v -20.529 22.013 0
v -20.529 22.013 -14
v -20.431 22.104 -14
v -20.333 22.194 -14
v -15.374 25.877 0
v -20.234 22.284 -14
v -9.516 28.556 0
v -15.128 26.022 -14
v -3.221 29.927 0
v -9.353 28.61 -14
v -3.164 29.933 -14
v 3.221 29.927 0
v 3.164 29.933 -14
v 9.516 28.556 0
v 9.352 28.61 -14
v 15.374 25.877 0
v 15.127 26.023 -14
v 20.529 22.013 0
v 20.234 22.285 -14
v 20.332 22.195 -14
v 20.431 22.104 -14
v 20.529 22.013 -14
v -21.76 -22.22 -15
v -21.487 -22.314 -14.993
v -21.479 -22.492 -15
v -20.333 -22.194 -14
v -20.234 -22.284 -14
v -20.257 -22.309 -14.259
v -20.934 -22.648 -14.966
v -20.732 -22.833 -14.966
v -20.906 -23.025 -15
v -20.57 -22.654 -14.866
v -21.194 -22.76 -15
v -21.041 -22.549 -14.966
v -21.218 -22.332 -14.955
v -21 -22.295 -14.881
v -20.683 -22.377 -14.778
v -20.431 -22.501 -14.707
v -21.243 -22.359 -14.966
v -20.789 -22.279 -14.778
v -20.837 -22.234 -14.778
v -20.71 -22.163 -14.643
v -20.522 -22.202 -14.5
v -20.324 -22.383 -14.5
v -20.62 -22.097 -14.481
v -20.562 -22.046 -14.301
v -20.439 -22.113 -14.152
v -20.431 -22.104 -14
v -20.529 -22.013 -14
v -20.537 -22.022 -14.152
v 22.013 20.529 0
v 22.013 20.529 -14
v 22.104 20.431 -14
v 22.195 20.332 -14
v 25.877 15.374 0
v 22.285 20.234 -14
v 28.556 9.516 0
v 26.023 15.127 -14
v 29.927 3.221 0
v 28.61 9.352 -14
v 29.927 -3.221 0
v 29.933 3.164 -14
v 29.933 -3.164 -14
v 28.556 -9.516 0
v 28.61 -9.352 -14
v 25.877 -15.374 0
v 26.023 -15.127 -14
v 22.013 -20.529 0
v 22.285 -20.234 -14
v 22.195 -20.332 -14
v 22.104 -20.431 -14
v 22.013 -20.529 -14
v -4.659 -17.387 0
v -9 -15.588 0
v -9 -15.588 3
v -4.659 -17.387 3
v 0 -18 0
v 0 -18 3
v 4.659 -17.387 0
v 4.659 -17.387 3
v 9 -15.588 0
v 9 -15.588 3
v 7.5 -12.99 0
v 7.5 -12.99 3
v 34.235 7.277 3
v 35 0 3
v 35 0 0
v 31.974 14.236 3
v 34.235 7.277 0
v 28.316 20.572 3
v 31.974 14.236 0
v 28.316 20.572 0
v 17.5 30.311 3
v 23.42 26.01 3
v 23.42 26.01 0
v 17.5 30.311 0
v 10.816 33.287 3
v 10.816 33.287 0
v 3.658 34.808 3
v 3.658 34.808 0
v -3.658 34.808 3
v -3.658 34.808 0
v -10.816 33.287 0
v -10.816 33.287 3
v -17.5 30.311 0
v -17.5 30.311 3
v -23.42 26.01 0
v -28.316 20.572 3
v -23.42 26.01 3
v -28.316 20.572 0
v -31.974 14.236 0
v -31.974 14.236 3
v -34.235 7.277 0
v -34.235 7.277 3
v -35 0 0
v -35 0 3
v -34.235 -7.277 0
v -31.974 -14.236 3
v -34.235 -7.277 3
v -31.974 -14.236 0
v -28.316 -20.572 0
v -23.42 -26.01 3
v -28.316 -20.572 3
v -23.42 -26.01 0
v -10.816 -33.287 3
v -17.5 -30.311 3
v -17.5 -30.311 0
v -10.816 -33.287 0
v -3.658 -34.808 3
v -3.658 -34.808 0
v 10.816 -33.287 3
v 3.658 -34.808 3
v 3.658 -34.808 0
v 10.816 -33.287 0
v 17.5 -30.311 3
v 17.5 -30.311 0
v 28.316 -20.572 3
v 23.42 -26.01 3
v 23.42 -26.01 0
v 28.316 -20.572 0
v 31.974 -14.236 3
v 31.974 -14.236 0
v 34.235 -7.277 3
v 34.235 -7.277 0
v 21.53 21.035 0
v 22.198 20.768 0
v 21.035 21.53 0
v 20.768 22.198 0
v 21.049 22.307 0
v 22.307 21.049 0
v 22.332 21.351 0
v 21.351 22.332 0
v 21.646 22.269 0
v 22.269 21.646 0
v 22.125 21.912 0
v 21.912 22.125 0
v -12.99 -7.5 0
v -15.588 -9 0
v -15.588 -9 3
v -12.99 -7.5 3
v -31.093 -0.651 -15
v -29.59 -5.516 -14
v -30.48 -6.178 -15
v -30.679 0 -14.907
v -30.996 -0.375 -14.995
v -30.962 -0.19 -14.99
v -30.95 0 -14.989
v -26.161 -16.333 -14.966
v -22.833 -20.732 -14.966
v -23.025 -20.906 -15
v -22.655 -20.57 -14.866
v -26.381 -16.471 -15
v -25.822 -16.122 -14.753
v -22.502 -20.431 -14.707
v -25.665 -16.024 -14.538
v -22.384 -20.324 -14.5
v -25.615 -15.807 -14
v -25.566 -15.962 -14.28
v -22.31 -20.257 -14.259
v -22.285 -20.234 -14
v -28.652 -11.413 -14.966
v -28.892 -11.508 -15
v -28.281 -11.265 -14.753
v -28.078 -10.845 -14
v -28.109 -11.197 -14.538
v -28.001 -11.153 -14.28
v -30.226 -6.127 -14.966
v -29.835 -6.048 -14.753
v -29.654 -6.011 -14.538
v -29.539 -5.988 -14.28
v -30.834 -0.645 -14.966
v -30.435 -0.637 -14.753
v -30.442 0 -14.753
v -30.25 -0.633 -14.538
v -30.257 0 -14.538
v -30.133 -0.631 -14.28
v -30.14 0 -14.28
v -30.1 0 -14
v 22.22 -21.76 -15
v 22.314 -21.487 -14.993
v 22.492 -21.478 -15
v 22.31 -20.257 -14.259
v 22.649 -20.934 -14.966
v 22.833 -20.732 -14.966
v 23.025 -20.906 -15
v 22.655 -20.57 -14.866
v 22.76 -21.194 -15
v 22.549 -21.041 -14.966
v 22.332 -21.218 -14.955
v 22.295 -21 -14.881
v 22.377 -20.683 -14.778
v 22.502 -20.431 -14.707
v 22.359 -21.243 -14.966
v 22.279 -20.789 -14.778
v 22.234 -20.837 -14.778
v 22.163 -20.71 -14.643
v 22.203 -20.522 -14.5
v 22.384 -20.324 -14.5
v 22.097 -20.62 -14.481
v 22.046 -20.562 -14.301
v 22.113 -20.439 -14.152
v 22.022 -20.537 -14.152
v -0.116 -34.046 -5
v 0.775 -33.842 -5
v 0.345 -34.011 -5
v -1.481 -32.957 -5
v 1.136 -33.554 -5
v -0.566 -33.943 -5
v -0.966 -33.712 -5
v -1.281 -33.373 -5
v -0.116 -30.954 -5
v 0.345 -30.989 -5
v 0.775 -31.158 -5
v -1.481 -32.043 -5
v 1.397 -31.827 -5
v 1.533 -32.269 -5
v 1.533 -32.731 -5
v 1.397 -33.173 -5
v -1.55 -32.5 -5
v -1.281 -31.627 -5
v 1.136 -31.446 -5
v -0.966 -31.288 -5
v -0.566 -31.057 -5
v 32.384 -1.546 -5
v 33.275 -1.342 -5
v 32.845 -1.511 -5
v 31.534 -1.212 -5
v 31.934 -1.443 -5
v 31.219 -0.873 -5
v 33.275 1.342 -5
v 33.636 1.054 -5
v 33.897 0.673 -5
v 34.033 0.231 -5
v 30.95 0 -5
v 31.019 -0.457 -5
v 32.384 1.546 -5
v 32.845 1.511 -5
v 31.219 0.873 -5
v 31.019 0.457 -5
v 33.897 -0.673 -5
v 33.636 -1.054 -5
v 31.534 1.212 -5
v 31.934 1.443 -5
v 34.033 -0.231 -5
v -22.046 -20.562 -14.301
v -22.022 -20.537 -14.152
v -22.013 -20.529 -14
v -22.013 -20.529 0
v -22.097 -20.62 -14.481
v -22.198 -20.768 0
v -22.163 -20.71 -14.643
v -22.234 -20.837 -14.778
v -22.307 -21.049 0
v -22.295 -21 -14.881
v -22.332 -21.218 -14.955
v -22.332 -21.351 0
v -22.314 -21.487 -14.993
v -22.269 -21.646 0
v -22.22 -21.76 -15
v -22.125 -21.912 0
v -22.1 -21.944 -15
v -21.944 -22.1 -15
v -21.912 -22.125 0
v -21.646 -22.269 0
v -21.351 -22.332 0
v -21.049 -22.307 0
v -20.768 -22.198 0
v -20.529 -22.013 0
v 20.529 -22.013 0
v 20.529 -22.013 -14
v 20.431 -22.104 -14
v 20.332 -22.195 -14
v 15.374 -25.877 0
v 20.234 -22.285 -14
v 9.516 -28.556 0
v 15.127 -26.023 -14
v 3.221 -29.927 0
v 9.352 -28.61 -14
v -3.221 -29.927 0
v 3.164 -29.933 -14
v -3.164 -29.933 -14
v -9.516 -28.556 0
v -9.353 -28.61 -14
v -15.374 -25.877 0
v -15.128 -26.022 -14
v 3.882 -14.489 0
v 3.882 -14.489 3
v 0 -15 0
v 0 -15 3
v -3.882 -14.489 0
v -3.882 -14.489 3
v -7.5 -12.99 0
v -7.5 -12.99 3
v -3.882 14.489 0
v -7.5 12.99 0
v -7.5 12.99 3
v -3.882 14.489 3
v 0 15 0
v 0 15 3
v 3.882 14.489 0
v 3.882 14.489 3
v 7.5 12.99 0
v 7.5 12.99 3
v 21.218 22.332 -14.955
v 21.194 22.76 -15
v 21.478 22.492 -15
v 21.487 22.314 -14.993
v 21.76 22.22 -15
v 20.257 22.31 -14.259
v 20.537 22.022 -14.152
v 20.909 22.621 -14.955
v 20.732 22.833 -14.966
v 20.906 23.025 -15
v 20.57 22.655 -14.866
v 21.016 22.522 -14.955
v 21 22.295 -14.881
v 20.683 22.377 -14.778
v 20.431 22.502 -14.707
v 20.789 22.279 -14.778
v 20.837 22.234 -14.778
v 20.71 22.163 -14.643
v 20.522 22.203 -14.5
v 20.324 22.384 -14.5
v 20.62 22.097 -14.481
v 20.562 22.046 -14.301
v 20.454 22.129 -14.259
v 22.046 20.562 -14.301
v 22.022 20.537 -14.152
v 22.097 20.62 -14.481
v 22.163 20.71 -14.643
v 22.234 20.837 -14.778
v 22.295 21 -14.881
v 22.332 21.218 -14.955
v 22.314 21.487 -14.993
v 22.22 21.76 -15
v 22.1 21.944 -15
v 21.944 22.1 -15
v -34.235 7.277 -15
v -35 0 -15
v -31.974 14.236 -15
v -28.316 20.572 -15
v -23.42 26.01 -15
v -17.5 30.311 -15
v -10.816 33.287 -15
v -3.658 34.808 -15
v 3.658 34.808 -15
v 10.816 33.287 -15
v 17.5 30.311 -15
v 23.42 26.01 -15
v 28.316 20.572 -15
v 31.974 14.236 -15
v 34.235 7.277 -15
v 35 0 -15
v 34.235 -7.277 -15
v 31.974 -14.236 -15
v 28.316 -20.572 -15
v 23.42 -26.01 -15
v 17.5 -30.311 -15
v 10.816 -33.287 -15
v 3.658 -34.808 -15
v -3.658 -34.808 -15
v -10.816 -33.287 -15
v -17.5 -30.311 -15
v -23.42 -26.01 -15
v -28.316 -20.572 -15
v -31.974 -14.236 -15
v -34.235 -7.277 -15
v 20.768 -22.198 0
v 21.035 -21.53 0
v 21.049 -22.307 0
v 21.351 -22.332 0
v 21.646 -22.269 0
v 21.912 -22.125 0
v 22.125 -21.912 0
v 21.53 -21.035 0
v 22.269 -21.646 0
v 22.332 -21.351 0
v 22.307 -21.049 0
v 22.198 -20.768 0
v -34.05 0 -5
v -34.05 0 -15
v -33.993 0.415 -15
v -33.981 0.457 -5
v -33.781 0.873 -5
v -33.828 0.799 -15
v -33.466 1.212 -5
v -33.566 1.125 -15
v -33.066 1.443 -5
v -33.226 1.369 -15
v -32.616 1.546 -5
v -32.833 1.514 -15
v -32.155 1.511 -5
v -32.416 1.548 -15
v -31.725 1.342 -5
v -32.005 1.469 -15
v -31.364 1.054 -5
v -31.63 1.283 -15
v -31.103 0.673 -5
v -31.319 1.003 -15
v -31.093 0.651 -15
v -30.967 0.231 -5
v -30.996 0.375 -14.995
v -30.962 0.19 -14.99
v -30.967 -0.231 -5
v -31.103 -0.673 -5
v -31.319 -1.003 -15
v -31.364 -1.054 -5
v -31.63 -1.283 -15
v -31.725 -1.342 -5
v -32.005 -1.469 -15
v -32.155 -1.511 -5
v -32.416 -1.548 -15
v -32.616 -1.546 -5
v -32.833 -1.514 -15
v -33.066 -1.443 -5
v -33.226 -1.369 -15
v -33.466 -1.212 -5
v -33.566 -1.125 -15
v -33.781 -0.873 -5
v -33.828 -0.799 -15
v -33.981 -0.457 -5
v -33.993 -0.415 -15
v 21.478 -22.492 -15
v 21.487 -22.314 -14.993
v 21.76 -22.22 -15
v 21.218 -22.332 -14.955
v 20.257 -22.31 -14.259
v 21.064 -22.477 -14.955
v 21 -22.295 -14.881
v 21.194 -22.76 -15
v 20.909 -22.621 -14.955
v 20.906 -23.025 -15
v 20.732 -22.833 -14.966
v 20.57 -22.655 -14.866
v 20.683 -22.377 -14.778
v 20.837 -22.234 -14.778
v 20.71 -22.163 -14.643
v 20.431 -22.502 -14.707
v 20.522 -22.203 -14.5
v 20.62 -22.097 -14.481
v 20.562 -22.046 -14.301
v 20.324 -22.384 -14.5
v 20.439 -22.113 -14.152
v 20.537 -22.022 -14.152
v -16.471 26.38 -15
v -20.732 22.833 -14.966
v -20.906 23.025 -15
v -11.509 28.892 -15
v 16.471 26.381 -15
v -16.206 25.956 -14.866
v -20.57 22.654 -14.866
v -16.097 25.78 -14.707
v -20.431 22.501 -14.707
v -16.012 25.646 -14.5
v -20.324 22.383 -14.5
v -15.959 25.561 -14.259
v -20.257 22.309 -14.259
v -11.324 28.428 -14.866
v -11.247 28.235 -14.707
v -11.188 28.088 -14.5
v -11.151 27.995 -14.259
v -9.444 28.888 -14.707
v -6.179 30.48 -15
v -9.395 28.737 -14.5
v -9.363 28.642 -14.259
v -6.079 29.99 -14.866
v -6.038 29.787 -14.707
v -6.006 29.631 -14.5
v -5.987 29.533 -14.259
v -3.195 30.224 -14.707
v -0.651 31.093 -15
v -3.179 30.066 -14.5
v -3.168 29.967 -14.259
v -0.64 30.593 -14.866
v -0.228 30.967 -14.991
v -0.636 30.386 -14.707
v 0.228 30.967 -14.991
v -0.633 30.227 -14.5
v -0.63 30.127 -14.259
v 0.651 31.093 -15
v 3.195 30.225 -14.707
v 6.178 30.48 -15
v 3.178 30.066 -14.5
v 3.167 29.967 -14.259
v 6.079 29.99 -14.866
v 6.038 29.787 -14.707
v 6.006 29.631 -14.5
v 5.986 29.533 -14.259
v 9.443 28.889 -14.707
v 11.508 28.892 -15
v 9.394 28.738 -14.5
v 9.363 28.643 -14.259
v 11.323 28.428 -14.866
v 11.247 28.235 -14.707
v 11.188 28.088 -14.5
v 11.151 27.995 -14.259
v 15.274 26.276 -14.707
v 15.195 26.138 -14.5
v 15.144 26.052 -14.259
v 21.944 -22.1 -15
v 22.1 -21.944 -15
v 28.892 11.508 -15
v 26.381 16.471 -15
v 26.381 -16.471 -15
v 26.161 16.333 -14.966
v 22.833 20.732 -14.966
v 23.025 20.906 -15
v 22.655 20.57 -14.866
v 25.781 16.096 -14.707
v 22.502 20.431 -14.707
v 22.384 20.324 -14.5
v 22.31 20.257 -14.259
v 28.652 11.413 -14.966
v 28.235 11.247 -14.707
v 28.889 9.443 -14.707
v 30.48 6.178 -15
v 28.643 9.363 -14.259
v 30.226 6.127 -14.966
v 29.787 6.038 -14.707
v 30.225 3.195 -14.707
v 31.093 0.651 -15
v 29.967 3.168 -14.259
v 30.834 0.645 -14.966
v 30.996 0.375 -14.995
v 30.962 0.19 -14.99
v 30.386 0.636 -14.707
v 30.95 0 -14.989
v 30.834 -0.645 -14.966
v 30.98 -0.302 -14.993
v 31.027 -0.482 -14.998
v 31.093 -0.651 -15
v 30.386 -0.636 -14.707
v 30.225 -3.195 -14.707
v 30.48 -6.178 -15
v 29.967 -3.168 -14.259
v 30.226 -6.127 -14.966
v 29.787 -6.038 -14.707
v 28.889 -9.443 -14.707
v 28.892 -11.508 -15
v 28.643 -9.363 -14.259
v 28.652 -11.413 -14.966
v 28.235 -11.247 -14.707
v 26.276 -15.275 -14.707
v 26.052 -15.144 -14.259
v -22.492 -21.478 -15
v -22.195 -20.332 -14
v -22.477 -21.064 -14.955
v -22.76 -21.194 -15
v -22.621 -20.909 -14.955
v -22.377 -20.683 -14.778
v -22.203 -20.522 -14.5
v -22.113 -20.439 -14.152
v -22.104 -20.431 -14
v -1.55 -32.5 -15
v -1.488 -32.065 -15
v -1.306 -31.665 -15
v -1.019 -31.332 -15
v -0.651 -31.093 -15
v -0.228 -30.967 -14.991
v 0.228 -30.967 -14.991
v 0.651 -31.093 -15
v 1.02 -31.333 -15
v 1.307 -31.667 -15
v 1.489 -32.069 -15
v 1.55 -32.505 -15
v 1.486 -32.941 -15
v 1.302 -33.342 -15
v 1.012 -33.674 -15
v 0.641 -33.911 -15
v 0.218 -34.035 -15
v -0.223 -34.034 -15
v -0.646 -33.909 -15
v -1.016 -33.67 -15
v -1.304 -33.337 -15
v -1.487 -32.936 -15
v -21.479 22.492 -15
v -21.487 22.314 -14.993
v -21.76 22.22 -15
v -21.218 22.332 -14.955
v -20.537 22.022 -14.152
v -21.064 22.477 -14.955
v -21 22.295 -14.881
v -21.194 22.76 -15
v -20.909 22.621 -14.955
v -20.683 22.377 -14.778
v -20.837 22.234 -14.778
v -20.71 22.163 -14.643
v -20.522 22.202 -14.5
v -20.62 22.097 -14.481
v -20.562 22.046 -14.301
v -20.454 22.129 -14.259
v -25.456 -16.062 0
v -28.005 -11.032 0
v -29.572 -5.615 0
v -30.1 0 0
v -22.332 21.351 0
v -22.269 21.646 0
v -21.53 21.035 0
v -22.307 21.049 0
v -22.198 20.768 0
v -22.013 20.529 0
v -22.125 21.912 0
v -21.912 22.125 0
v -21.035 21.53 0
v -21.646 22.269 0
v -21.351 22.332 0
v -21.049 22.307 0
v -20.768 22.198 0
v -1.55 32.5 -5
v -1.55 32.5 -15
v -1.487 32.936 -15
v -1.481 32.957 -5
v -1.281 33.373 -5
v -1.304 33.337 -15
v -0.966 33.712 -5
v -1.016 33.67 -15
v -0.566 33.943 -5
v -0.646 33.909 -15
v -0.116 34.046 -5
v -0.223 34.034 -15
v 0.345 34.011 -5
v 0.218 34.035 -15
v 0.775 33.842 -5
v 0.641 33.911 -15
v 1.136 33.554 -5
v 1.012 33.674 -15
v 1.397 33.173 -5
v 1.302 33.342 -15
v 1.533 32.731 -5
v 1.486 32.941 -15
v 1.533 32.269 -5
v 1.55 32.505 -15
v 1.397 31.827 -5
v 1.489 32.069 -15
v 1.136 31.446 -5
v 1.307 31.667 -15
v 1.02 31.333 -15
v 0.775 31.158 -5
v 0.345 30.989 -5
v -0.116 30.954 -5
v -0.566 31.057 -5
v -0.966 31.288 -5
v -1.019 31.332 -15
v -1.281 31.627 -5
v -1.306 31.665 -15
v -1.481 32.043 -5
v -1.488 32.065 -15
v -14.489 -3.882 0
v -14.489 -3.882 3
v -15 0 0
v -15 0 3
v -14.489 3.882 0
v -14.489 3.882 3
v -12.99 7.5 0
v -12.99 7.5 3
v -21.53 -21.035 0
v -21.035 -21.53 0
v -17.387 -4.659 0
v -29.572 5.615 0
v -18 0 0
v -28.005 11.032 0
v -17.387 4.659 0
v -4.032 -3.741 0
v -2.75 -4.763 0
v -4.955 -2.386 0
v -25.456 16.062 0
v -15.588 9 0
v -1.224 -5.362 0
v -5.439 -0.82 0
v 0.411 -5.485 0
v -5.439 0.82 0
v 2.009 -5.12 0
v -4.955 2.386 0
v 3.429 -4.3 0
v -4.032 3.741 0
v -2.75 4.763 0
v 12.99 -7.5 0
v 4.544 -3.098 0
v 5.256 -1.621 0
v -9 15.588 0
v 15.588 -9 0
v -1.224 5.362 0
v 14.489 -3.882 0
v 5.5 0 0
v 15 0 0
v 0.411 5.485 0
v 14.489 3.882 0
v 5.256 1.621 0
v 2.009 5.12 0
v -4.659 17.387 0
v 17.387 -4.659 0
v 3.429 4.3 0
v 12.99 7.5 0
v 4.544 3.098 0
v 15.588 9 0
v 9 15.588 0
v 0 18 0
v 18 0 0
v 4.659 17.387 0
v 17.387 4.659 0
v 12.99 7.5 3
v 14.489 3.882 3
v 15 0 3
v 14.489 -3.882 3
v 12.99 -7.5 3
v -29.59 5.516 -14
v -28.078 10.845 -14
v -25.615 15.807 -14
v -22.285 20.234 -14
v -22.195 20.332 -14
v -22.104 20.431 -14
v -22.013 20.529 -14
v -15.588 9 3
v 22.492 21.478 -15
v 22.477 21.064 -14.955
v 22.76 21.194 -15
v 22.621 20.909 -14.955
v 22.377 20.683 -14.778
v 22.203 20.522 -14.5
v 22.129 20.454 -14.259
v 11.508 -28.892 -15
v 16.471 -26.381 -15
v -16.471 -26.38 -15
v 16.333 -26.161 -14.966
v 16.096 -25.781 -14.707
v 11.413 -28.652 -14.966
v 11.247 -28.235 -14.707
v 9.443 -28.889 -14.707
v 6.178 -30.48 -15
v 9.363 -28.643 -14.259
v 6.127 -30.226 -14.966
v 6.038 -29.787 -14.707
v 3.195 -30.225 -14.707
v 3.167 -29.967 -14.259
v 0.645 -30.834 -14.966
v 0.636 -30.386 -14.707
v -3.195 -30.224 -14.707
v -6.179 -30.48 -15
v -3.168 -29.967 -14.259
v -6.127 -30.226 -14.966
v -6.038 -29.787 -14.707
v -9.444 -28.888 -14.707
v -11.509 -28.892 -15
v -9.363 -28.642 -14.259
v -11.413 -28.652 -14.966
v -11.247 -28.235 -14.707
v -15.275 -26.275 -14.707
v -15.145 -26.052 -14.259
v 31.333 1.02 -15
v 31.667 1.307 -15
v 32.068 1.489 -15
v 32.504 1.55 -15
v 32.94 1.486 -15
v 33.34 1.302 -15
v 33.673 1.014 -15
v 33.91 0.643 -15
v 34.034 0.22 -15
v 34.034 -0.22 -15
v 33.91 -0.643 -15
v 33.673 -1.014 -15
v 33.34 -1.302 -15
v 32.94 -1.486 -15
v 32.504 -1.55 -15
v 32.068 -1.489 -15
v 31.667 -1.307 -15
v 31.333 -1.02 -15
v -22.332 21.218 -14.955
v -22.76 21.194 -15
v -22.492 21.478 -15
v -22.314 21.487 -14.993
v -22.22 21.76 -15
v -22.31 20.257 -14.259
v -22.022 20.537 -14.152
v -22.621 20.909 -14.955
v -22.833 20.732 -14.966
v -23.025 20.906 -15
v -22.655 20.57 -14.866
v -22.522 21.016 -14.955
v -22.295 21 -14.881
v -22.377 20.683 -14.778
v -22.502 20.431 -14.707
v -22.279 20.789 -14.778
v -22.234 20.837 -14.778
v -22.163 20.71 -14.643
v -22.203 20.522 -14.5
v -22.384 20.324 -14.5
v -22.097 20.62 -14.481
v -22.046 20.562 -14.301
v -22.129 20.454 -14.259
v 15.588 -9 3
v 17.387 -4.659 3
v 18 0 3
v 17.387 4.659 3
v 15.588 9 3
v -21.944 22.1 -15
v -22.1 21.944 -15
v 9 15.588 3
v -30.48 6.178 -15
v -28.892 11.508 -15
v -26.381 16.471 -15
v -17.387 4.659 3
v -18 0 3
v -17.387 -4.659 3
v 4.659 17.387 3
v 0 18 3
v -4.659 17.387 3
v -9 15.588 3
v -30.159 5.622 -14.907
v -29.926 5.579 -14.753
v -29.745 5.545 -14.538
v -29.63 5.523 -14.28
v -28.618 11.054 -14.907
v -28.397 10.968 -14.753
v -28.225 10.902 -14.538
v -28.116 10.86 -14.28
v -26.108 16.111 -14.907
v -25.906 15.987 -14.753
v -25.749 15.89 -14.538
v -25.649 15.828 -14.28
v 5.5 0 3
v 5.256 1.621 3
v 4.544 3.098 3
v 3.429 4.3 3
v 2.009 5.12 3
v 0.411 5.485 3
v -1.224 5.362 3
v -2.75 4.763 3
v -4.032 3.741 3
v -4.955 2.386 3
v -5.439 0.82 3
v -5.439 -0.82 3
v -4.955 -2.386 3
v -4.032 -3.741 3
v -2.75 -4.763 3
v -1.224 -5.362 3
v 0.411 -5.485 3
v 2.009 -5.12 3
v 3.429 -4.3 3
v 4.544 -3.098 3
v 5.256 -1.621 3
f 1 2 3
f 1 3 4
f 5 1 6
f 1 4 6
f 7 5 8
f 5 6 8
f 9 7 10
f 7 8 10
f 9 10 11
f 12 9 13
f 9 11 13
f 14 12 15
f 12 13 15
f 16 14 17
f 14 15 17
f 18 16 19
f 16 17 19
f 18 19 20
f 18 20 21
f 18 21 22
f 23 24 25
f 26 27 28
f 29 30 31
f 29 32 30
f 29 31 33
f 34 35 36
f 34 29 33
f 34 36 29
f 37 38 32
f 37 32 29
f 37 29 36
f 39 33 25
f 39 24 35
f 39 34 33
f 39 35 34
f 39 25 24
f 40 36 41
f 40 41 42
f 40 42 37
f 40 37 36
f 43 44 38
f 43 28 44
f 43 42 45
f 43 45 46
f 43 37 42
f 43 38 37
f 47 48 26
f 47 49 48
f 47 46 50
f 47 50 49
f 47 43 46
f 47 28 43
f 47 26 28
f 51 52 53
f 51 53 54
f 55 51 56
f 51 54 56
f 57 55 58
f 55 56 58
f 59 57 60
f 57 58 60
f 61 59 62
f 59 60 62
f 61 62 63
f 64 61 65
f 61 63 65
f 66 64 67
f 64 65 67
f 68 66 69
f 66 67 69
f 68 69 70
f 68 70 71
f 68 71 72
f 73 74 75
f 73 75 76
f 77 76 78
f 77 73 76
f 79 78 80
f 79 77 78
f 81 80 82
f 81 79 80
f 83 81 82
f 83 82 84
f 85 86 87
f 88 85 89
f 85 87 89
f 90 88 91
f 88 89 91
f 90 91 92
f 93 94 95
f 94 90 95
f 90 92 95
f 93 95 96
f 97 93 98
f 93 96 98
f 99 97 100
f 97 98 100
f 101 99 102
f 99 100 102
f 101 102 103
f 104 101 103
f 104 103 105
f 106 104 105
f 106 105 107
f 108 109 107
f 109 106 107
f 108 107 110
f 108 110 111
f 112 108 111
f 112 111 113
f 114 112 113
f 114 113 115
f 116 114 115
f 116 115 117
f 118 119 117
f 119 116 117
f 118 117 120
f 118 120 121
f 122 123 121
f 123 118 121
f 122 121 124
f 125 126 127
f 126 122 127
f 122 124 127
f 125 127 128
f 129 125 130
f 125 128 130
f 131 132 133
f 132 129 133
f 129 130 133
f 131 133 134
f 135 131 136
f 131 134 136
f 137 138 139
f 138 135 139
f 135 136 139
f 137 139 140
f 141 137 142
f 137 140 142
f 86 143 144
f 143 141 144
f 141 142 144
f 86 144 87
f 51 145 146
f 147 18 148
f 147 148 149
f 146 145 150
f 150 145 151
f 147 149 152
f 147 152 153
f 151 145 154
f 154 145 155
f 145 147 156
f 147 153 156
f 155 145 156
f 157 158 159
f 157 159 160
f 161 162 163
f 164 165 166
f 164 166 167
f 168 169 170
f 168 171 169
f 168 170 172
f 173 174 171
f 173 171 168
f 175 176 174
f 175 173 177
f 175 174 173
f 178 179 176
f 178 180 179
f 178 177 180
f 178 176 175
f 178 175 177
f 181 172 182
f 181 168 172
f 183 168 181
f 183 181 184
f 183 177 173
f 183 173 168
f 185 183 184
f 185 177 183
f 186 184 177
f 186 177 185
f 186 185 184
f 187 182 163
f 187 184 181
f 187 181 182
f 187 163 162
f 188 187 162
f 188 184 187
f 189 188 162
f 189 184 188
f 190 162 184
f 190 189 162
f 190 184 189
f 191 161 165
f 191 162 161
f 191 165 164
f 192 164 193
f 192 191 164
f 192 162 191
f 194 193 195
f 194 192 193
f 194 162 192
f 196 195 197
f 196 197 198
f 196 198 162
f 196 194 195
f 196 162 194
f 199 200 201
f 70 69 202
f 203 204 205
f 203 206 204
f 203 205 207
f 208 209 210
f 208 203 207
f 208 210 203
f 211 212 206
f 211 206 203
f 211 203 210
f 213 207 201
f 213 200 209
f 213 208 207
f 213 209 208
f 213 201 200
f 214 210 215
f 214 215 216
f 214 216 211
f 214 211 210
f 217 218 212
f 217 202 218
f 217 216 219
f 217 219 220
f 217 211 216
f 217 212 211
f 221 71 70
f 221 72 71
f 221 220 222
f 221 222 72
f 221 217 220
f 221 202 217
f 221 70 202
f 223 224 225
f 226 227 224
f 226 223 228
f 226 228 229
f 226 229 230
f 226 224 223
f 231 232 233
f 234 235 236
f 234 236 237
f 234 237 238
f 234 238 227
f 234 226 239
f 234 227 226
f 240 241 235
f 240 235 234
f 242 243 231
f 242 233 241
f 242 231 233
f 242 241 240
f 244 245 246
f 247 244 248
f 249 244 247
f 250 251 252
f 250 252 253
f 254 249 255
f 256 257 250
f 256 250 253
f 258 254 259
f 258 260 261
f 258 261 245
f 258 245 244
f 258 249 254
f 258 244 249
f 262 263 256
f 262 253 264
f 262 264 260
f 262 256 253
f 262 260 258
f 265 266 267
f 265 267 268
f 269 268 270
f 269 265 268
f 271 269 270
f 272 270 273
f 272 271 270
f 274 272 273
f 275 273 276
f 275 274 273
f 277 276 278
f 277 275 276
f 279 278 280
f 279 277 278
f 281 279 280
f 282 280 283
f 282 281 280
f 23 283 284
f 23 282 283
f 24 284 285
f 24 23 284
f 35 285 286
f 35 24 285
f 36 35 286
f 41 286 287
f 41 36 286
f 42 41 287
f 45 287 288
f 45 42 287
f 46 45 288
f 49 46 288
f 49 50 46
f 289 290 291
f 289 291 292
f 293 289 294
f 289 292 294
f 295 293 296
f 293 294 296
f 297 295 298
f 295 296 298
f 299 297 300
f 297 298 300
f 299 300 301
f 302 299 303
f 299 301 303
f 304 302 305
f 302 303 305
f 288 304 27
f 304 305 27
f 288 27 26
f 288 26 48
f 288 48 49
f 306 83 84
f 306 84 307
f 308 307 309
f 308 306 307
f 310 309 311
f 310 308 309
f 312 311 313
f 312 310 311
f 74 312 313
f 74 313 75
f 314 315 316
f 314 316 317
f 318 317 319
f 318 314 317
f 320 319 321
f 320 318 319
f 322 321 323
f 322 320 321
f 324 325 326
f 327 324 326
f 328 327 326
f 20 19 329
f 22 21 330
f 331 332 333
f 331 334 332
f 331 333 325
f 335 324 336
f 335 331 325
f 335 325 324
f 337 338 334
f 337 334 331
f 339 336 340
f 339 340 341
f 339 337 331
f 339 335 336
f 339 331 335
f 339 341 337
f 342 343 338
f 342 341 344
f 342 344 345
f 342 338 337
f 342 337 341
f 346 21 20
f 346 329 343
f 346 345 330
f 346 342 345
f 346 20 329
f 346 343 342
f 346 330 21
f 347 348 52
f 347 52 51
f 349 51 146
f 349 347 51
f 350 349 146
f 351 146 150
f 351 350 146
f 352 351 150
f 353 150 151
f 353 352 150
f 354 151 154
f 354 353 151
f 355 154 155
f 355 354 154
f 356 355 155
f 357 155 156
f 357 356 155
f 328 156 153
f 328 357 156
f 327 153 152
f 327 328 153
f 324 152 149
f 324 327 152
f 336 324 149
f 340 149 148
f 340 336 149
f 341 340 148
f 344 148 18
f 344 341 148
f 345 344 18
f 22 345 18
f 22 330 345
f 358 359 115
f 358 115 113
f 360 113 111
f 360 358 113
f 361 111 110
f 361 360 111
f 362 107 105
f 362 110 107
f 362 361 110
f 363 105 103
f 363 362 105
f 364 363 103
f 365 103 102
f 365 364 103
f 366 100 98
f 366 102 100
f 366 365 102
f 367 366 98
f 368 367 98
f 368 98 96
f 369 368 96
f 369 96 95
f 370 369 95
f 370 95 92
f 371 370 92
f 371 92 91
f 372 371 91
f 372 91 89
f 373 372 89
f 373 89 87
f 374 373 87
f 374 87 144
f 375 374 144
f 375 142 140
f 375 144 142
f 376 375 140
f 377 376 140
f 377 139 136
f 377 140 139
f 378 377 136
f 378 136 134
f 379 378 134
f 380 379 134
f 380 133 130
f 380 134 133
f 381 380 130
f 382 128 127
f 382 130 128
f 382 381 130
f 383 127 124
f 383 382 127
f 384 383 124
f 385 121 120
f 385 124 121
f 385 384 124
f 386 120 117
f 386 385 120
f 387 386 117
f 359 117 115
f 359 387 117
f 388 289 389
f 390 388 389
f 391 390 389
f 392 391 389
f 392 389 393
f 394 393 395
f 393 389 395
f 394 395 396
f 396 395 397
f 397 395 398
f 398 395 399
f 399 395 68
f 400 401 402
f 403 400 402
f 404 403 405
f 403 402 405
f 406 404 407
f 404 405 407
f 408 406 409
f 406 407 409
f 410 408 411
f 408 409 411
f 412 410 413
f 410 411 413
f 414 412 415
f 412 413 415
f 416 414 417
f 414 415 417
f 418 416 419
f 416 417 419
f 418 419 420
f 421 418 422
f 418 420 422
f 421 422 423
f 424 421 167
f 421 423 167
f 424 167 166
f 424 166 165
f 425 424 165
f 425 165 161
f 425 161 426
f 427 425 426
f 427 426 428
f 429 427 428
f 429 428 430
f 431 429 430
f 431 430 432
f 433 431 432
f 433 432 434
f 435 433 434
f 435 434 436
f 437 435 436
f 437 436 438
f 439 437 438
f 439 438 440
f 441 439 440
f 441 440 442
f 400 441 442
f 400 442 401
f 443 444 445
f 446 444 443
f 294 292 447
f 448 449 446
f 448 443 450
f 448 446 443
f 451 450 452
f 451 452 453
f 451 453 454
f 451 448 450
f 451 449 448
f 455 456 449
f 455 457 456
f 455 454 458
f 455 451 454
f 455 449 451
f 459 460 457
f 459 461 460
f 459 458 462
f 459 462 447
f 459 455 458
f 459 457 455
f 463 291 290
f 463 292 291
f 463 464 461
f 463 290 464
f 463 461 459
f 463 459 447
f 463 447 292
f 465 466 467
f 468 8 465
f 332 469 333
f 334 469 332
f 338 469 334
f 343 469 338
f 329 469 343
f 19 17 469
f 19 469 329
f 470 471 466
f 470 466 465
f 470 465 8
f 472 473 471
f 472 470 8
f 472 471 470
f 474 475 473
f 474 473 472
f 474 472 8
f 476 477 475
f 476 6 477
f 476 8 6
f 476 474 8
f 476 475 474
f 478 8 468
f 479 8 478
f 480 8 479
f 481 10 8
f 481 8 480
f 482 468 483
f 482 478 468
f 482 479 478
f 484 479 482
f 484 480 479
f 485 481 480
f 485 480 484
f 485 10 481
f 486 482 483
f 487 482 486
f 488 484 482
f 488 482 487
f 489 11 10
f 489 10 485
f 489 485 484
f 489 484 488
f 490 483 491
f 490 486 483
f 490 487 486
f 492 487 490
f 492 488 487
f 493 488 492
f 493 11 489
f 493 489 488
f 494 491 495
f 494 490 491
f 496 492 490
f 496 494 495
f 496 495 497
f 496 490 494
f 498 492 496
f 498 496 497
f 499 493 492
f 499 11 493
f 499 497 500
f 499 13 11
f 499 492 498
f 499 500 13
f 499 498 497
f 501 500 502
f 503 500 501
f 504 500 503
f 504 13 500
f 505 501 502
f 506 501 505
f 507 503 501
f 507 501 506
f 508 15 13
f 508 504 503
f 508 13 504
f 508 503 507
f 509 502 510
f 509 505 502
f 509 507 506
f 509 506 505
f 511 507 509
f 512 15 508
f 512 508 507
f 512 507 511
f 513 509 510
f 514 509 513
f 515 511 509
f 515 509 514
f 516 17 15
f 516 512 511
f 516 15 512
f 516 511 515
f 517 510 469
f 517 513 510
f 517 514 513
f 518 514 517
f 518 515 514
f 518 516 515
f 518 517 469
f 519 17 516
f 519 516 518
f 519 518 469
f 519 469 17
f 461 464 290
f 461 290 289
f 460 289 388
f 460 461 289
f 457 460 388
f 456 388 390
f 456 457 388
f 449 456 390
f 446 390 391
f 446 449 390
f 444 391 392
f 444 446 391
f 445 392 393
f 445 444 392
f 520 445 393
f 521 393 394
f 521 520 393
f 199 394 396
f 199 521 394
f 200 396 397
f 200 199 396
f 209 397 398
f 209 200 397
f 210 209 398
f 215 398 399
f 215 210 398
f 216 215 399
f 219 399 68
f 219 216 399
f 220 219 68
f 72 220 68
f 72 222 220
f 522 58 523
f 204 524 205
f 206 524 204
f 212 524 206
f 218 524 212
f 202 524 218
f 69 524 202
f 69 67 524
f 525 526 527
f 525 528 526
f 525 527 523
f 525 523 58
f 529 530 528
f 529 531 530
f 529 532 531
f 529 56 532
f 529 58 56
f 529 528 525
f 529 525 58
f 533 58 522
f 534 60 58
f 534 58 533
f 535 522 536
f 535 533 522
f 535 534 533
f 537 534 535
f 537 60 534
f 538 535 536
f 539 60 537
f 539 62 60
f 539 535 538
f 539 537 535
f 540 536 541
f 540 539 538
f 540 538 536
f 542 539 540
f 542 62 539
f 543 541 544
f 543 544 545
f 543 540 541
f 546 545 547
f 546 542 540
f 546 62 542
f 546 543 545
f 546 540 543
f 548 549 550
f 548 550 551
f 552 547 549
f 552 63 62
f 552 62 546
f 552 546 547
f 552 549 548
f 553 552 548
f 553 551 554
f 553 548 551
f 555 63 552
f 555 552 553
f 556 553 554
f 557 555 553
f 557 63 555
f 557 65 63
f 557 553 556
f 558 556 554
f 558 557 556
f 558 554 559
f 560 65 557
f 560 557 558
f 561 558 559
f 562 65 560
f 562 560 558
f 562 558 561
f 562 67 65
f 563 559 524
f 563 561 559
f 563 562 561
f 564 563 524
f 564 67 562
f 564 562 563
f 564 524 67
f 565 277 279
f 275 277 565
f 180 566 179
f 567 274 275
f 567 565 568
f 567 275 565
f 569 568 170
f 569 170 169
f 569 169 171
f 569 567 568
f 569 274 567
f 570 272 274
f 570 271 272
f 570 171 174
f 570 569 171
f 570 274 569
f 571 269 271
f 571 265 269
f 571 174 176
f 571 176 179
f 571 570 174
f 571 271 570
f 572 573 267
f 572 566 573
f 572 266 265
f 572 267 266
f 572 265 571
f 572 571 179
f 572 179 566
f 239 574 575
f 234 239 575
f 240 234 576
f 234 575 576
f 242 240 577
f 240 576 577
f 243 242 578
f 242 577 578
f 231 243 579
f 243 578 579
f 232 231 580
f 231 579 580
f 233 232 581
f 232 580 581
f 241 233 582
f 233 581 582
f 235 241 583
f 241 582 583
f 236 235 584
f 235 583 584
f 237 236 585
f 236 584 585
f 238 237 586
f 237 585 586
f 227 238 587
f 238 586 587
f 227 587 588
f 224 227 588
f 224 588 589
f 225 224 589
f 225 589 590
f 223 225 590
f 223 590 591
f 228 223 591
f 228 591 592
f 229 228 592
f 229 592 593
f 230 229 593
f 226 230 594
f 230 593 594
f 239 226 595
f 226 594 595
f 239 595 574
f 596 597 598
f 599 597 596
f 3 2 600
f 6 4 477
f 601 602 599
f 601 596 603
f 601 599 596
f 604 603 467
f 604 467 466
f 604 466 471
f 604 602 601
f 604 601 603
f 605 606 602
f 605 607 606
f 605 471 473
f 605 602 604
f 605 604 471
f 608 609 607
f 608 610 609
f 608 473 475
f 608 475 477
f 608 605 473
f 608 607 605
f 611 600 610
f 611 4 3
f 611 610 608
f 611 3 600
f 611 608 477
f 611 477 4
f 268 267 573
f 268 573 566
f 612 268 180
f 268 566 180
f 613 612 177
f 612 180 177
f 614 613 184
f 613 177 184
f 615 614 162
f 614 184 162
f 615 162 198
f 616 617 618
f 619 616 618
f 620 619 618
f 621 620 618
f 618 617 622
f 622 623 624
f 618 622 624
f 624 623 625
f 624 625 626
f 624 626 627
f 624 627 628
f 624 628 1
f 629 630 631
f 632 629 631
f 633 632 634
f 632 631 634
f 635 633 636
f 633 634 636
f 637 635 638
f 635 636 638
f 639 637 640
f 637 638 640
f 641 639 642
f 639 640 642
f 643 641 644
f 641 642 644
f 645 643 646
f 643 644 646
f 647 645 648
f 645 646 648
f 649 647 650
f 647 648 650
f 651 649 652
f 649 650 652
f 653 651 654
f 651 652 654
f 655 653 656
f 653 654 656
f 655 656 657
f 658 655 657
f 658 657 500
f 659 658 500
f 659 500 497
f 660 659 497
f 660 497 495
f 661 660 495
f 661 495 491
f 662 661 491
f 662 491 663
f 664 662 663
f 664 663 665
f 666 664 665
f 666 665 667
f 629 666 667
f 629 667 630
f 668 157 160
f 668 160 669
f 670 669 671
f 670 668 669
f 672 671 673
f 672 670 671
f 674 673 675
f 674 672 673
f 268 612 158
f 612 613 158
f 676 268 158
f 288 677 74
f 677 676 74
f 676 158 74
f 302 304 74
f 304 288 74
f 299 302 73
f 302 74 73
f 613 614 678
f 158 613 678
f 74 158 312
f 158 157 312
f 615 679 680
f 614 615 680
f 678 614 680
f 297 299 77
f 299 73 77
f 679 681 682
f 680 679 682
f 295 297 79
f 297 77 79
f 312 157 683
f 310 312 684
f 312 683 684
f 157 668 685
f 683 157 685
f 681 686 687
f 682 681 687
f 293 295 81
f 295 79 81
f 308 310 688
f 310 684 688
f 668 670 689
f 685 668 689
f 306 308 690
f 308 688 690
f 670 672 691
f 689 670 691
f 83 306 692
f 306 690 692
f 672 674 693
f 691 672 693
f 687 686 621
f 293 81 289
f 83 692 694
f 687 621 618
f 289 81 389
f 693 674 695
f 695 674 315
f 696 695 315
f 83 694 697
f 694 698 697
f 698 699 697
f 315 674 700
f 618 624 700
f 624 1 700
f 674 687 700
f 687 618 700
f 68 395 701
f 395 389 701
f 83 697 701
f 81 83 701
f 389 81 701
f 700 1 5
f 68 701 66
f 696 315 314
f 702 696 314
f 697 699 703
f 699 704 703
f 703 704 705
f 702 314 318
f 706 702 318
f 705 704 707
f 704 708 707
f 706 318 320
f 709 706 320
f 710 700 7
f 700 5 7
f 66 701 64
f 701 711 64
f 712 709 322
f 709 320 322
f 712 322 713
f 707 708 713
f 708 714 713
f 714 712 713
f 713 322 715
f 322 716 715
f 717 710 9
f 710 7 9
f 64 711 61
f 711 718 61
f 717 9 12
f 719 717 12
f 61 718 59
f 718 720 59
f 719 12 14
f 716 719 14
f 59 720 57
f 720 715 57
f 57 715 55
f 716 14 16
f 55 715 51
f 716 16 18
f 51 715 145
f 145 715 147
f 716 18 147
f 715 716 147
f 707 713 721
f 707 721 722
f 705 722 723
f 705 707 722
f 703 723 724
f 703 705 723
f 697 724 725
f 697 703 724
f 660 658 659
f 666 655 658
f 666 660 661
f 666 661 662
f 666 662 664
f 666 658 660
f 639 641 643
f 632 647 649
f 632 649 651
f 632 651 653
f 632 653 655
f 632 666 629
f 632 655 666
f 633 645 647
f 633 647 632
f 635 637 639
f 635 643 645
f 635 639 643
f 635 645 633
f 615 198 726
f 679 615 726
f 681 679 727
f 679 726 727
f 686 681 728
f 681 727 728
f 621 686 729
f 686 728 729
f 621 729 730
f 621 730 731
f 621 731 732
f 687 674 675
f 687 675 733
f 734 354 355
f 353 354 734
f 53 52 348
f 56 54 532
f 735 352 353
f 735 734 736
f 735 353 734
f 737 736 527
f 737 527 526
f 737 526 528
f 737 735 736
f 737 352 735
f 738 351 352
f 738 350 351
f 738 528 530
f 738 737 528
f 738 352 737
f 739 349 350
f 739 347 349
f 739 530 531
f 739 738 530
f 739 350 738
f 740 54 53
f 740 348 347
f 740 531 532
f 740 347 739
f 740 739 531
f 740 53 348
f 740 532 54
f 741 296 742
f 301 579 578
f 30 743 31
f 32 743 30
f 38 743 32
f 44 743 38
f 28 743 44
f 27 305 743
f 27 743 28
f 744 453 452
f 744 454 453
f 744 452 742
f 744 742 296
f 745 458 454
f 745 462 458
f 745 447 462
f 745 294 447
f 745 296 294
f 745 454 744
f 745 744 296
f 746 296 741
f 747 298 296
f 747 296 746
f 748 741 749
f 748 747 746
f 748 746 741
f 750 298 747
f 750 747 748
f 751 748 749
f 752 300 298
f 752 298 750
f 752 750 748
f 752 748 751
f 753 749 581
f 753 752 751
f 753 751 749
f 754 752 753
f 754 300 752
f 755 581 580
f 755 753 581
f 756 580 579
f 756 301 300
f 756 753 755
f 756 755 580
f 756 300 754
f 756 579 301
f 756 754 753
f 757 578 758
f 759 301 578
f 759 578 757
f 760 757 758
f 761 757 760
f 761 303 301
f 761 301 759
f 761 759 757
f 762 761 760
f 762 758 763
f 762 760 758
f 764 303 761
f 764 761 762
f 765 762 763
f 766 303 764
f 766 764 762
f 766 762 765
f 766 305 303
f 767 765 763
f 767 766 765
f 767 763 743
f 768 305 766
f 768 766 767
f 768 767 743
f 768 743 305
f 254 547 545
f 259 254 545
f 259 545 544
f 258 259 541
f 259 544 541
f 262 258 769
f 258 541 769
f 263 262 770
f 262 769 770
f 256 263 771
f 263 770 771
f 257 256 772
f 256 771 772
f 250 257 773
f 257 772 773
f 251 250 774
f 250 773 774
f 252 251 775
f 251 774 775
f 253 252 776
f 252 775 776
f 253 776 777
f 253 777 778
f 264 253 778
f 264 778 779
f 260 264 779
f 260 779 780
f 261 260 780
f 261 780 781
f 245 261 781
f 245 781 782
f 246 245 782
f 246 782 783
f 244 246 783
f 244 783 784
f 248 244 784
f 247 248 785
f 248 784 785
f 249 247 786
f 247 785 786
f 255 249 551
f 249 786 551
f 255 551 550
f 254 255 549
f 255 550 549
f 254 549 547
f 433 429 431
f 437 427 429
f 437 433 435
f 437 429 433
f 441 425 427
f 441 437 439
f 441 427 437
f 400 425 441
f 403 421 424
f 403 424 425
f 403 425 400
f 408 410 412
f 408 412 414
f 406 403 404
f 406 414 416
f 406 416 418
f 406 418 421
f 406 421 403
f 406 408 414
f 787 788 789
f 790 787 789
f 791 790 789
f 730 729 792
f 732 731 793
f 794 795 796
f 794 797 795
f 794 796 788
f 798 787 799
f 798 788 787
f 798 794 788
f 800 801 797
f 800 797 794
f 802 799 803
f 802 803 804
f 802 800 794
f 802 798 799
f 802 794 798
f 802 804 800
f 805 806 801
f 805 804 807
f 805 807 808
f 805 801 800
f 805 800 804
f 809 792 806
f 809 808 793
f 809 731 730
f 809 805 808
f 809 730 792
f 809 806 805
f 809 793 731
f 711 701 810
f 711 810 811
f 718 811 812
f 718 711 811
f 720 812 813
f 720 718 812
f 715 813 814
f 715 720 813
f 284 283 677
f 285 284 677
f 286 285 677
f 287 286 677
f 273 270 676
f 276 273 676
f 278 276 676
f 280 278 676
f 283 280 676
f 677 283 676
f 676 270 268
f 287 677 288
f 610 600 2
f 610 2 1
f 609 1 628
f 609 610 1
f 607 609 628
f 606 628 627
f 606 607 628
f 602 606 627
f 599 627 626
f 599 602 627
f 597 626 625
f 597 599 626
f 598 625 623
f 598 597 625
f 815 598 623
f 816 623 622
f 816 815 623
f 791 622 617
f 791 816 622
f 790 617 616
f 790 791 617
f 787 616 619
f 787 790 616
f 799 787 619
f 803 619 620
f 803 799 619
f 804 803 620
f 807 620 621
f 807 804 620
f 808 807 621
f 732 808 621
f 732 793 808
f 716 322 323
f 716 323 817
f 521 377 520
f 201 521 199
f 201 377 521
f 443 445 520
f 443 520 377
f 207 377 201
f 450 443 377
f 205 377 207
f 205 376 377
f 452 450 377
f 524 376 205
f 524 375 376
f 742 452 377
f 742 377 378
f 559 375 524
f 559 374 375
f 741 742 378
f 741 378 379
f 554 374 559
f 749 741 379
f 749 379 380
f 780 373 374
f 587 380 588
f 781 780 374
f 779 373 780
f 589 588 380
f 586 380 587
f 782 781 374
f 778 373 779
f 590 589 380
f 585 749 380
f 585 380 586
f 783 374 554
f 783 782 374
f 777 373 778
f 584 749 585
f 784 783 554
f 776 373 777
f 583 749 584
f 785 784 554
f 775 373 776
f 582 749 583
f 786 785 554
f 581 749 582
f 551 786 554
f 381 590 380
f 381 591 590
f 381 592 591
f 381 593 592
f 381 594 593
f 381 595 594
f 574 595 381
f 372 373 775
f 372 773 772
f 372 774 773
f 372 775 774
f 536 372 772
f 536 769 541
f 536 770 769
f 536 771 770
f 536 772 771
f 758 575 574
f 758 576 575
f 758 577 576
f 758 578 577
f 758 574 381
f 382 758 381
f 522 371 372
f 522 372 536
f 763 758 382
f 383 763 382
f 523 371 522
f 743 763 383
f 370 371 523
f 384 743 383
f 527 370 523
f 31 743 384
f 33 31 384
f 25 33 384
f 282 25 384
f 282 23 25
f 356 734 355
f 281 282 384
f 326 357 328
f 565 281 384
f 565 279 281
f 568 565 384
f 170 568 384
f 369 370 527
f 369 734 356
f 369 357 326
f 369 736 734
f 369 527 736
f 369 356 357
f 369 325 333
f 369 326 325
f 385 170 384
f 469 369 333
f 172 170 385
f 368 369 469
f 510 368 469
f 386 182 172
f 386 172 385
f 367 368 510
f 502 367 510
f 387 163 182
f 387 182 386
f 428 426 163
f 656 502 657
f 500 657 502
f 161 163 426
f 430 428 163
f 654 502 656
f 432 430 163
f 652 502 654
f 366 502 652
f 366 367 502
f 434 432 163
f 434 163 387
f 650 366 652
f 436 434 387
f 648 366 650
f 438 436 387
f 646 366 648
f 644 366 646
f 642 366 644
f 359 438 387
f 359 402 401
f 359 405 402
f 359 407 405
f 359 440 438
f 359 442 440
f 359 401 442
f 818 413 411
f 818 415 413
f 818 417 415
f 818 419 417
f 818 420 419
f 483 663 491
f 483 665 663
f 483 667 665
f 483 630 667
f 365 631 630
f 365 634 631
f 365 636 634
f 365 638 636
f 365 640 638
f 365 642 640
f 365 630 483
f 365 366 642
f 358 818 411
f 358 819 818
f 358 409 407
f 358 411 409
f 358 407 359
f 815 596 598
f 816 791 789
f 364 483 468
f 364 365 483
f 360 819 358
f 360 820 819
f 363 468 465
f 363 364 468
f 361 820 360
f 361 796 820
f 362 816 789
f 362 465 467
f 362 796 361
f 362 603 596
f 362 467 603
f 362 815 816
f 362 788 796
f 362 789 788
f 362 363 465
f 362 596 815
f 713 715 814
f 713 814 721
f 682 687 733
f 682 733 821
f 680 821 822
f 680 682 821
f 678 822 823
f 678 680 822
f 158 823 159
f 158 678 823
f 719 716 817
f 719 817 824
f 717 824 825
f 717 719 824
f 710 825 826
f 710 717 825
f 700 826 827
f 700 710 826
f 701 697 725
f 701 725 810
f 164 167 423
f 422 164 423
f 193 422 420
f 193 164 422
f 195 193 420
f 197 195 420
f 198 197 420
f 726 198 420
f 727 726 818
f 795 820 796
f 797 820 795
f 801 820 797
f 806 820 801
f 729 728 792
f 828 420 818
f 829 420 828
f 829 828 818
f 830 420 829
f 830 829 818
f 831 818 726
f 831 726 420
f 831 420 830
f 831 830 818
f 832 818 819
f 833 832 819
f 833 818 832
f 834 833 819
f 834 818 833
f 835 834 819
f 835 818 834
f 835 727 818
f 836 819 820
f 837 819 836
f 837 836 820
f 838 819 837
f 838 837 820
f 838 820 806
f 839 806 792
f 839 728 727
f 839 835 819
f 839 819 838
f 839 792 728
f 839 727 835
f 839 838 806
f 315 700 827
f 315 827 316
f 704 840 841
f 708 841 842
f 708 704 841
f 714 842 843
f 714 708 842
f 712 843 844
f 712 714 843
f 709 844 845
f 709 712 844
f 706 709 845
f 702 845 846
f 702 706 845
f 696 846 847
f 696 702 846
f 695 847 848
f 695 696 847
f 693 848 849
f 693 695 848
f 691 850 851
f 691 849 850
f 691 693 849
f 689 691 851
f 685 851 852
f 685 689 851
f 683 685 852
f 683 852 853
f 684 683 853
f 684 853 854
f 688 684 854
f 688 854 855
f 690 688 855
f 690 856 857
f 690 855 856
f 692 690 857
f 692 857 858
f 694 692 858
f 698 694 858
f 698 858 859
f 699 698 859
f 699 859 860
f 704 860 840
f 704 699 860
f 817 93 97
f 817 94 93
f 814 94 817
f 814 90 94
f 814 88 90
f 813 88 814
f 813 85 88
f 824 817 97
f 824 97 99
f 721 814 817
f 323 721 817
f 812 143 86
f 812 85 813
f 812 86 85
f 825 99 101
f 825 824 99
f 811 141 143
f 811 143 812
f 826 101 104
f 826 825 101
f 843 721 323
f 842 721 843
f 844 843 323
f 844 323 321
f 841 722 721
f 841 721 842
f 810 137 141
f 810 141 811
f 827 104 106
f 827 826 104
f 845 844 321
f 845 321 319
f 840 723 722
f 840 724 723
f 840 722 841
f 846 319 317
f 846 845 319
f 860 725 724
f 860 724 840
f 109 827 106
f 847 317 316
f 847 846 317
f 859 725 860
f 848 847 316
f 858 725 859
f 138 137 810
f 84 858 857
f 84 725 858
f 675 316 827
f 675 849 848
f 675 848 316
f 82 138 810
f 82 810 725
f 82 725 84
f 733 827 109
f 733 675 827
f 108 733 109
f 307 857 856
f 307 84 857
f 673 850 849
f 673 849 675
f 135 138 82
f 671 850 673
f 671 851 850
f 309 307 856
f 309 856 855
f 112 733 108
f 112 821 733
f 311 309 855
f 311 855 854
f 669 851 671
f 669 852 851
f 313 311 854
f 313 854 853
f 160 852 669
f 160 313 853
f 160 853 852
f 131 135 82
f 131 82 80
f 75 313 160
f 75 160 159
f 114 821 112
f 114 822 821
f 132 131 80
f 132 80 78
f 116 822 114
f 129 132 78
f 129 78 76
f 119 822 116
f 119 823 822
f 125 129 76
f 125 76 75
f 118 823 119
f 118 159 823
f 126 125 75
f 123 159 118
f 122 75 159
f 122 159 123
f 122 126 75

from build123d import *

# Parameters (mm, degrees)
SKETCH_2_R          = 35
SKETCH_2_R_2        = 5.5
EXTRUDE_1_DEPTH     = 5
EXTRUDE_START       = 15
SKETCH_3_R          = 35
SKETCH_3_R_2        = 30.1
EXTRUDE_2_DEPTH     = 15
SKETCH_4_R          = 1.55
CUT_EXTRUDE_1_DEPTH = 10
CUT_EXTRUDE_5_DEPTH = 15
FILLET_1_R          = 1
CUT_EXTRUDE_START   = -2
SKETCH_10_R         = 35
CUT_EXTRUDE_6_DEPTH = 2
CUT_EXTRUDE_7_DEPTH = 10


with BuildPart() as part:
    # 草图2 → 凸台-拉伸1 (new body)
    with BuildSketch(Plane.XY):
        Circle(SKETCH_2_R)
        Circle(SKETCH_2_R_2, mode=Mode.SUBTRACT)
    extrude(amount=EXTRUDE_1_DEPTH)

    # 草图3 → 凸台-拉伸2 (add)
    with BuildSketch(Plane(origin=(0, 0, 0), x_dir=(-1, 0, 0), z_dir=(0, 0, -1)).offset(EXTRUDE_START)):
        Circle(SKETCH_3_R)
        Circle(SKETCH_3_R_2, mode=Mode.SUBTRACT)
    extrude(amount=-EXTRUDE_2_DEPTH)

    # 草图4 → 切除-拉伸1 (cut)
    with BuildSketch(Plane(origin=(0, 0, -15), x_dir=(-1, 0, 0), z_dir=(0, 0, -1))):
        with Locations((0, 32.5)):
            Circle(SKETCH_4_R)
        with Locations((32.5, 0)):
            Circle(SKETCH_4_R)
        with Locations((0, -32.5)):
            Circle(SKETCH_4_R)
        with Locations((-32.5, 0)):
            Circle(SKETCH_4_R)
    extrude(amount=-CUT_EXTRUDE_1_DEPTH, mode=Mode.SUBTRACT)

    # 草图9 → 切除-拉伸5 (cut)
    with BuildSketch(Plane(origin=(0, 0, -15), x_dir=(-1, 0, 0), z_dir=(0, 0, -1))):
        with BuildLine():
            ThreePointArc((-22.013313369, 20.528615017), (-22.026376234, 22.026376234), (-20.528615017, 22.013313369))
            ThreePointArc((-20.528615017, 22.013313369), (-21.283914114, 21.283914114), (-22.013313369, 20.528615017))
        make_face()
        with BuildLine():
            ThreePointArc((20.528615017, 22.013313369), (22.026376234, 22.026376234), (22.013313369, 20.528615017))
            ThreePointArc((22.013313369, 20.528615017), (21.283914114, 21.283914114), (20.528615017, 22.013313369))
        make_face()
        with BuildLine():
            ThreePointArc((22.013313369, -20.528615017), (22.026376234, -22.026376234), (20.528615017, -22.013313369))
            ThreePointArc((20.528615017, -22.013313369), (21.283914114, -21.283914114), (22.013313369, -20.528615017))
        make_face()
        with BuildLine():
            ThreePointArc((-20.528615017, -22.013313369), (-22.026376234, -22.026376234), (-22.013313369, -20.528615017))
            ThreePointArc((-22.013313369, -20.528615017), (-21.283914114, -21.283914114), (-20.528615017, -22.013313369))
        make_face()
    extrude(amount=-CUT_EXTRUDE_5_DEPTH, mode=Mode.SUBTRACT)

    # 圆角1
    # the kernel refuses this fillet: 1 mm, written as the material it takes off along each edge
    with BuildSketch(Plane(origin=(0, 0, -15), x_dir=(-0.7403558797037455, 0.6722151228498904, 0), z_dir=(-0.6722151228498904, -0.7403558797037455, 0))) as fillet_1_piece_1:
        with BuildLine():
            CenterArc((30.1 + FILLET_1_R, -FILLET_1_R), FILLET_1_R, 90, 90)
            Line((30.1, -FILLET_1_R), (30.1, 0))
            Line((30.1, 0), (30.1 + FILLET_1_R, 0))
        make_face()
    revolve(axis=Axis((0, 0, -15), (0, 0, -1)), revolution_arc=95.523479776, mode=Mode.SUBTRACT)
    with BuildSketch(Plane(origin=(0, 0, -15), x_dir=(0.6722151228498918, 0.7403558797037441, 0), z_dir=(-0.7403558797037441, 0.6722151228498918, 0))) as fillet_1_piece_2:
        with BuildLine():
            CenterArc((30.1 + FILLET_1_R, -FILLET_1_R), FILLET_1_R, 90, 90)
            Line((30.1, -FILLET_1_R), (30.1, 0))
            Line((30.1, 0), (30.1 + FILLET_1_R, 0))
        make_face()
    revolve(axis=Axis((0, 0, -15), (0, 0, -1)), revolution_arc=95.523479776, mode=Mode.SUBTRACT)
    with BuildSketch(Plane(origin=(0, 0, -15), x_dir=(0.7403558797037453, -0.6722151228498905, 0), z_dir=(0.6722151228498905, 0.7403558797037453, 0))) as fillet_1_piece_3:
        with BuildLine():
            CenterArc((30.1 + FILLET_1_R, -FILLET_1_R), FILLET_1_R, 90, 90)
            Line((30.1, -FILLET_1_R), (30.1, 0))
            Line((30.1, 0), (30.1 + FILLET_1_R, 0))
        make_face()
    revolve(axis=Axis((0, 0, -15), (0, 0, -1)), revolution_arc=95.523479776, mode=Mode.SUBTRACT)
    with BuildSketch(Plane(origin=(0, 0, -15), x_dir=(-1, 0, 0), z_dir=(0, -1, 0))) as fillet_1_piece_4:
        with BuildLine():
            CenterArc((30.1 + FILLET_1_R, -FILLET_1_R), FILLET_1_R, 90, 90)
            Line((30.1, -FILLET_1_R), (30.1, 0))
            Line((30.1, 0), (30.1 + FILLET_1_R, 0))
        make_face()
    revolve(axis=Axis((0, 0, -15), (0, 0, -1)), revolution_arc=47.760430641, mode=Mode.SUBTRACT)
    with BuildSketch(Plane(origin=(0, 0, -15), x_dir=(-0.6722320403041436, -0.7403405189428228, 0), z_dir=(0.7403405189428228, -0.6722320403041436, 0))) as fillet_1_piece_5:
        with BuildLine():
            CenterArc((30.1 + FILLET_1_R, -FILLET_1_R), FILLET_1_R, 90, 90)
            Line((30.1, -FILLET_1_R), (30.1, 0))
            Line((30.1, 0), (30.1 + FILLET_1_R, 0))
        make_face()
    revolve(axis=Axis((0, 0, -15), (0, 0, -1)), revolution_arc=47.760430641, mode=Mode.SUBTRACT)

    # 草图10 → 切除-拉伸6 (cut)
    with BuildSketch(Plane.XY.offset(5).offset(CUT_EXTRUDE_START)):
        with Locations(Location((0, 0, 0), (0, 0, 180))):
            Circle(SKETCH_10_R)
    extrude(amount=CUT_EXTRUDE_6_DEPTH, mode=Mode.SUBTRACT)

    # 草图11 → 切除-拉伸7 (cut)
    with BuildSketch(Plane(origin=(0, 0, 0), x_dir=(-1, 0, 0), z_dir=(0, 0, -1))):
        with BuildLine():
            Line((12.990381057, 7.5), (15.588457268, 9))
            ThreePointArc((15.588457268, 9), (18, 0), (15.588457268, -9))
            Line((15.588457268, -9), (12.990381057, -7.5))
            ThreePointArc((12.990381057, -7.5), (15, 0), (12.990381057, 7.5))
        make_face()
        with BuildLine():
            Line((-7.5, 12.990381057), (-9, 15.588457268))
            ThreePointArc((-9, 15.588457268), (0, 18), (9, 15.588457268))
            Line((9, 15.588457268), (7.5, 12.990381057))
            ThreePointArc((7.5, 12.990381057), (0, 15), (-7.5, 12.990381057))
        make_face()
        with BuildLine():
            Line((7.5, -12.990381057), (9, -15.588457268))
            ThreePointArc((9, -15.588457268), (0, -18), (-9, -15.588457268))
            Line((-9, -15.588457268), (-7.5, -12.990381057))
            ThreePointArc((-7.5, -12.990381057), (0, -15), (7.5, -12.990381057))
        make_face()
        with BuildLine():
            Line((-12.990381057, -7.5), (-15.588457268, -9))
            ThreePointArc((-15.588457268, -9), (-18, 0), (-15.588457268, 9))
            Line((-15.588457268, 9), (-12.990381057, 7.5))
            ThreePointArc((-12.990381057, 7.5), (-15, 0), (-12.990381057, -7.5))
        make_face()
    extrude(amount=-CUT_EXTRUDE_7_DEPTH, mode=Mode.SUBTRACT)


solid = part.part
